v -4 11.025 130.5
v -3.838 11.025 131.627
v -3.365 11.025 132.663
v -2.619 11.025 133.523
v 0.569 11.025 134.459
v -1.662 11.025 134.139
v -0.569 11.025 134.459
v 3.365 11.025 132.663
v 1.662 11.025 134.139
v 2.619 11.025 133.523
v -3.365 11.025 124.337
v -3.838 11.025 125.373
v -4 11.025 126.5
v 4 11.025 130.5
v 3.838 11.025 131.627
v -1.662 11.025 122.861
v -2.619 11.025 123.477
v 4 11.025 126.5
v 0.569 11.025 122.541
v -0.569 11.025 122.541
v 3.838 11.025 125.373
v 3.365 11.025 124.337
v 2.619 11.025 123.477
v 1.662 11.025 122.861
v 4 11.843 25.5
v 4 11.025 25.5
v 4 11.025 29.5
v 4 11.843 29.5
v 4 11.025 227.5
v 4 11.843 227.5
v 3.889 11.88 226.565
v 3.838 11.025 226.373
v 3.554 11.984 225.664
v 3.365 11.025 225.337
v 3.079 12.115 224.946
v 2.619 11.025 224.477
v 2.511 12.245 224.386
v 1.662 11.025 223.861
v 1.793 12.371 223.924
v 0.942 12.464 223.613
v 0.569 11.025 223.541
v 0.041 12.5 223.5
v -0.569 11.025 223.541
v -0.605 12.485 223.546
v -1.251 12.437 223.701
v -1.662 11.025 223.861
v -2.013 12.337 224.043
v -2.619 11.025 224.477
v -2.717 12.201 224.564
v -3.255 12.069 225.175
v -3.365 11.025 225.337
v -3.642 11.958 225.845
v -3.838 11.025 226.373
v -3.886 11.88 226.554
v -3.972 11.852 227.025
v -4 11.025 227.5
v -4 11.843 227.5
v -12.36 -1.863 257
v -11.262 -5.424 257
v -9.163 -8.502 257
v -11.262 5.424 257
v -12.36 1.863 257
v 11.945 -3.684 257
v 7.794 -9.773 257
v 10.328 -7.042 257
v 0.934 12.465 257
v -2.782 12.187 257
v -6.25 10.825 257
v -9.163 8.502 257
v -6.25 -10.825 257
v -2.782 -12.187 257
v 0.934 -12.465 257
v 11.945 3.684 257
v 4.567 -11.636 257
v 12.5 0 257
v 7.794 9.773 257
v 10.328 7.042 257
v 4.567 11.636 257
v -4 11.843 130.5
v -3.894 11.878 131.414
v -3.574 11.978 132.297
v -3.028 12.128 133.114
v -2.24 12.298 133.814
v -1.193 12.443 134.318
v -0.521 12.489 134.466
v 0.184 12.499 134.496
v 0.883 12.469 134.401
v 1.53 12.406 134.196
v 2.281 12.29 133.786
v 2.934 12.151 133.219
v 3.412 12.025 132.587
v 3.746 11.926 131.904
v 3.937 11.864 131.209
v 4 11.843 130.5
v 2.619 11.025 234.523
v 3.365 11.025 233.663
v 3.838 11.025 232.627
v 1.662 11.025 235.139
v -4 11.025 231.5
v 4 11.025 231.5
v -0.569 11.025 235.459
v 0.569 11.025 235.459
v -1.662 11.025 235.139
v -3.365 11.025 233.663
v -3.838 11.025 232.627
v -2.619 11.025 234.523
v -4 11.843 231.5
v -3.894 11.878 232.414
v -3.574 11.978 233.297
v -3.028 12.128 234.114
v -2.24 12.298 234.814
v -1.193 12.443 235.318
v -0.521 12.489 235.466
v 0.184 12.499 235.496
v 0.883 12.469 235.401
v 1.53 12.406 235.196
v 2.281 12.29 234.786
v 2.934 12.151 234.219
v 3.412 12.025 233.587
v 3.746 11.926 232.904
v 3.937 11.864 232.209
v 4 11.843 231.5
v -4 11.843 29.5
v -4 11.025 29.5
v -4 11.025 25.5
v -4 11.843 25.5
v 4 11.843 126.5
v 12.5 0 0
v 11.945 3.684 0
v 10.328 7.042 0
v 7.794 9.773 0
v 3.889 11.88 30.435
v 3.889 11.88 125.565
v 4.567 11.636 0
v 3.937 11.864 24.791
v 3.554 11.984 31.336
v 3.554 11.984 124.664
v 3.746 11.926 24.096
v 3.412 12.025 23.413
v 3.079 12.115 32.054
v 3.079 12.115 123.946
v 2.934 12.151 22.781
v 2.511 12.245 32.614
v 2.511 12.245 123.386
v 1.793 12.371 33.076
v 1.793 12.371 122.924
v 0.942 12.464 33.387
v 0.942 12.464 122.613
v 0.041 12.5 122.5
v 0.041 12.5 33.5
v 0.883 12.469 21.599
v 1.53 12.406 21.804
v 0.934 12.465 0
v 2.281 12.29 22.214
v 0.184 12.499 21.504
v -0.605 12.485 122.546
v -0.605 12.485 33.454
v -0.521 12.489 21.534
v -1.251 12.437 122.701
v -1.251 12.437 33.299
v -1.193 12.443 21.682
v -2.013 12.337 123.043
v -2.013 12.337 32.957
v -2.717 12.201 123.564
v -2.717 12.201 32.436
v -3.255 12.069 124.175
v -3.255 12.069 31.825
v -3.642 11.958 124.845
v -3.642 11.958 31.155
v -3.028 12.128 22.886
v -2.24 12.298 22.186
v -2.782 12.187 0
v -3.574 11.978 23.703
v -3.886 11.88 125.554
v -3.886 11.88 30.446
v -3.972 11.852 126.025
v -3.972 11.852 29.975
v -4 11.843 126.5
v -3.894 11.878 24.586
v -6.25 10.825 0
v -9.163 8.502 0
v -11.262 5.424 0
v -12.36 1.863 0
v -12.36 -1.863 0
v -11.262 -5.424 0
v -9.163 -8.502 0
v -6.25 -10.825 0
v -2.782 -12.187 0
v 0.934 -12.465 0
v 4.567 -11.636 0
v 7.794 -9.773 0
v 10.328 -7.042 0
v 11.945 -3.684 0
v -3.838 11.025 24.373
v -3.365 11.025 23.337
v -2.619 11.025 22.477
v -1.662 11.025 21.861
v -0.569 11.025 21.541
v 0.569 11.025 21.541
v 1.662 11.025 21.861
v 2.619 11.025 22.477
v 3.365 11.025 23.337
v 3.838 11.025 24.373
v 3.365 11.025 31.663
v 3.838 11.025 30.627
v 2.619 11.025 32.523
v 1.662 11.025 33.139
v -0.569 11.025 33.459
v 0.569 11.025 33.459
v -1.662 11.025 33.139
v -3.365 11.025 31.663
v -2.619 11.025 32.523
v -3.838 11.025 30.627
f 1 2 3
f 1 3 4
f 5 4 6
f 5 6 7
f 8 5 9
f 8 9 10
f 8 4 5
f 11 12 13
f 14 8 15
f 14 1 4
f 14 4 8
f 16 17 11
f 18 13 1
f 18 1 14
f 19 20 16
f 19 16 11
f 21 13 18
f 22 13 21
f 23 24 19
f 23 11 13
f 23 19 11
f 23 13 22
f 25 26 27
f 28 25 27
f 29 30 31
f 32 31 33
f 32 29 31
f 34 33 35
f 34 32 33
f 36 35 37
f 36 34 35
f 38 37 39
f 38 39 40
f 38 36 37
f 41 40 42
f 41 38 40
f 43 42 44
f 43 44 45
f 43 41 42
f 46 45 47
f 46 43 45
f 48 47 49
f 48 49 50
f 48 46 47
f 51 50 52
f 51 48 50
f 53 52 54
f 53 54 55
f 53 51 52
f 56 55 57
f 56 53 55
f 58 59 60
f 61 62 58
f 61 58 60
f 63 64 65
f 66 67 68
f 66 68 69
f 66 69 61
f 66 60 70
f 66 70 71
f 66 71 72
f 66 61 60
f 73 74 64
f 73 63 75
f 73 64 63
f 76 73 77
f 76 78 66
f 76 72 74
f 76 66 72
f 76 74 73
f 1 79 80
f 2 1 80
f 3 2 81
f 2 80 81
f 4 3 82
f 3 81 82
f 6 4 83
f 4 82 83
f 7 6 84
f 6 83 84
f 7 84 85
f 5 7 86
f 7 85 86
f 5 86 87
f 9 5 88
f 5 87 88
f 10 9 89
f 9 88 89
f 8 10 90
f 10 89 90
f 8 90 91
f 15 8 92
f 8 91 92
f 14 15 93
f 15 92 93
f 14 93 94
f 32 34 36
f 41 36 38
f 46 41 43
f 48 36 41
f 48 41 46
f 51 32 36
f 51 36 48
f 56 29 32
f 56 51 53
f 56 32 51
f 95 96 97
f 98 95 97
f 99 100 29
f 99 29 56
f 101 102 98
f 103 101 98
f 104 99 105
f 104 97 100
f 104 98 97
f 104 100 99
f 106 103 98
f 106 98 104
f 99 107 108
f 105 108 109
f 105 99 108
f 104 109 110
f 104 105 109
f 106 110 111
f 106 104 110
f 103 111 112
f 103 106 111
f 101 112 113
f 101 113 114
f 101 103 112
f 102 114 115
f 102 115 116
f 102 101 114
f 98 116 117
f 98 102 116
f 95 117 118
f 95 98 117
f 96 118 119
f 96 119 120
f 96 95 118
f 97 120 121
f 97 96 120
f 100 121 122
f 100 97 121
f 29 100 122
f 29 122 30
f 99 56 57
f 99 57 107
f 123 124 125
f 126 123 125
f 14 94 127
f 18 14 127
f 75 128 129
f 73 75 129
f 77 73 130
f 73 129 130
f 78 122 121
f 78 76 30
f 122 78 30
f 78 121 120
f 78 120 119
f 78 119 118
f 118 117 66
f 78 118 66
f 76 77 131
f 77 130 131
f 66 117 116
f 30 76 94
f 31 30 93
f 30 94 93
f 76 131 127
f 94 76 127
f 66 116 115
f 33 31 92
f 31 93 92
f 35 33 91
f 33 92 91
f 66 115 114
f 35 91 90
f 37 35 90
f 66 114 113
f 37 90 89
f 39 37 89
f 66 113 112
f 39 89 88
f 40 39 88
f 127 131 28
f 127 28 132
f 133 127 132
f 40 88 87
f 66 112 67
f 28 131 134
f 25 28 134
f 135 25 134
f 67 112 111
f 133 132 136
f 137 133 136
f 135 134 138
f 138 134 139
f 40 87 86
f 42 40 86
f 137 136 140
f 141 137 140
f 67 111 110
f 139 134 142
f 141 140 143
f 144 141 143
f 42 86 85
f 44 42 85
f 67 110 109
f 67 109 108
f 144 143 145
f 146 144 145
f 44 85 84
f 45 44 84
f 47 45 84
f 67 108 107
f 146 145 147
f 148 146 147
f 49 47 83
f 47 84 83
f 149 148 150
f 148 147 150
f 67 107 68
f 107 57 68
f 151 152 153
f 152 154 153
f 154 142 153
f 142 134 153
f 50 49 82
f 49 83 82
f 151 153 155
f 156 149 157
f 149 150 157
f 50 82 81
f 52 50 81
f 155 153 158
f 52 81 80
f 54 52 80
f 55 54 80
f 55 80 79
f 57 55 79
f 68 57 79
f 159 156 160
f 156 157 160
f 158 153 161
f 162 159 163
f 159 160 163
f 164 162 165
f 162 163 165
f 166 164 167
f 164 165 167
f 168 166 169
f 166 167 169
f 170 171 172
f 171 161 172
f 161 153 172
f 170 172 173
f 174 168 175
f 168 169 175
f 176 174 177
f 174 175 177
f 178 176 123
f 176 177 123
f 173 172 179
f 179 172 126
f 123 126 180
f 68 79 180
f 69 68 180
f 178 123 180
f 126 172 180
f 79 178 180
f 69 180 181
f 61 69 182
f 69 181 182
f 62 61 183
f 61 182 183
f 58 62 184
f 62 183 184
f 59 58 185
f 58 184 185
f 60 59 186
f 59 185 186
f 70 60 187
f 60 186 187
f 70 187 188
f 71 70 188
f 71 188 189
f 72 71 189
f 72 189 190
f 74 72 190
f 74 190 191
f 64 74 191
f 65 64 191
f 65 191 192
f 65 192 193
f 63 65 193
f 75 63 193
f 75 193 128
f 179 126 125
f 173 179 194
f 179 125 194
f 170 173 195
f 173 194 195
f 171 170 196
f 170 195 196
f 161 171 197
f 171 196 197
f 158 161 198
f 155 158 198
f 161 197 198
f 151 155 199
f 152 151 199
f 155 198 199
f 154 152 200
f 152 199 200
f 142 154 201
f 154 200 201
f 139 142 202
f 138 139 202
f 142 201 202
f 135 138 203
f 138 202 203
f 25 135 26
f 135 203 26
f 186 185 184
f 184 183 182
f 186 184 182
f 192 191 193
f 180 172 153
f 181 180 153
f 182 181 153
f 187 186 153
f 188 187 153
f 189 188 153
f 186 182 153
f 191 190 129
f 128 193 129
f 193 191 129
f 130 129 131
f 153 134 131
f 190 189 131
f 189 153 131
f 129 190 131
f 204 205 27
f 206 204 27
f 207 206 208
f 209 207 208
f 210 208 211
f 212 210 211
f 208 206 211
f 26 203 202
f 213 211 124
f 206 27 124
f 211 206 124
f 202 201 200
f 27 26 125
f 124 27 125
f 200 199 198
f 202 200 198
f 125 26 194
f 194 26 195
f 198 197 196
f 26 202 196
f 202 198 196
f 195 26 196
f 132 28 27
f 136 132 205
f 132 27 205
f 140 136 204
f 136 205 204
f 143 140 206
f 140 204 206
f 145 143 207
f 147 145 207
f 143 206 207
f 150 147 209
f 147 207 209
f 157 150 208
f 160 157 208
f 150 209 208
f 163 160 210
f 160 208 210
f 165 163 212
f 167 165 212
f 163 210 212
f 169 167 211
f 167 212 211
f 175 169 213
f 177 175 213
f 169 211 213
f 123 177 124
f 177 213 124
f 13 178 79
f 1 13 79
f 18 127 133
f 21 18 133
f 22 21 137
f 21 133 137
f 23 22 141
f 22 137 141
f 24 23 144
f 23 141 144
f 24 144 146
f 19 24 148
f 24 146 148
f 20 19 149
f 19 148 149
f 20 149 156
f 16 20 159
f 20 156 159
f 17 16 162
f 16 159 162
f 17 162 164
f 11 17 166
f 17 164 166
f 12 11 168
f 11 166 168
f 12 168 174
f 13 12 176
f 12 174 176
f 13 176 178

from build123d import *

# Parameters (mm, degrees)
SKETCH_1_R          = 12.5
EXTRUDE_1_DEPTH     = 257
CUT_EXTRUDE_1_DEPTH = 0.975


with BuildPart() as part:
    # 草图1 → 凸台-拉伸1 (new body)
    with BuildSketch(Plane.XY):
        Circle(SKETCH_1_R)
    extrude(amount=EXTRUDE_1_DEPTH)

    # 草图6 → 切除-拉伸1 (cut, symmetric)
    with BuildSketch(Plane(origin=(0, 12, 0), x_dir=(1, 0, 0), z_dir=(0, 1, 0))):
        with BuildLine():
            Line((-4, -29.5), (-4, -25.5))
            ThreePointArc((-4, -25.5), (0, -21.5), (4, -25.5))
            Line((4, -25.5), (4, -29.5))
            ThreePointArc((4, -29.5), (0, -33.5), (-4, -29.5))
        make_face()
        with BuildLine():
            Line((-4, -126.5), (-4, -130.5))
            ThreePointArc((-4, -130.5), (0, -134.5), (4, -130.5))
            Line((4, -130.5), (4, -126.5))
            ThreePointArc((4, -126.5), (0, -122.5), (-4, -126.5))
        make_face()
    cut_extrude_1 = extrude(amount=CUT_EXTRUDE_1_DEPTH, both=True, mode=Mode.SUBTRACT)

    # 镜向1: 切除-拉伸1 across plane
    add(cut_extrude_1.mirror(Plane(origin=(0, 0, 128.5), x_dir=(1, 0, 0), z_dir=(0, 0, -1))), mode=Mode.SUBTRACT)


solid = part.part
